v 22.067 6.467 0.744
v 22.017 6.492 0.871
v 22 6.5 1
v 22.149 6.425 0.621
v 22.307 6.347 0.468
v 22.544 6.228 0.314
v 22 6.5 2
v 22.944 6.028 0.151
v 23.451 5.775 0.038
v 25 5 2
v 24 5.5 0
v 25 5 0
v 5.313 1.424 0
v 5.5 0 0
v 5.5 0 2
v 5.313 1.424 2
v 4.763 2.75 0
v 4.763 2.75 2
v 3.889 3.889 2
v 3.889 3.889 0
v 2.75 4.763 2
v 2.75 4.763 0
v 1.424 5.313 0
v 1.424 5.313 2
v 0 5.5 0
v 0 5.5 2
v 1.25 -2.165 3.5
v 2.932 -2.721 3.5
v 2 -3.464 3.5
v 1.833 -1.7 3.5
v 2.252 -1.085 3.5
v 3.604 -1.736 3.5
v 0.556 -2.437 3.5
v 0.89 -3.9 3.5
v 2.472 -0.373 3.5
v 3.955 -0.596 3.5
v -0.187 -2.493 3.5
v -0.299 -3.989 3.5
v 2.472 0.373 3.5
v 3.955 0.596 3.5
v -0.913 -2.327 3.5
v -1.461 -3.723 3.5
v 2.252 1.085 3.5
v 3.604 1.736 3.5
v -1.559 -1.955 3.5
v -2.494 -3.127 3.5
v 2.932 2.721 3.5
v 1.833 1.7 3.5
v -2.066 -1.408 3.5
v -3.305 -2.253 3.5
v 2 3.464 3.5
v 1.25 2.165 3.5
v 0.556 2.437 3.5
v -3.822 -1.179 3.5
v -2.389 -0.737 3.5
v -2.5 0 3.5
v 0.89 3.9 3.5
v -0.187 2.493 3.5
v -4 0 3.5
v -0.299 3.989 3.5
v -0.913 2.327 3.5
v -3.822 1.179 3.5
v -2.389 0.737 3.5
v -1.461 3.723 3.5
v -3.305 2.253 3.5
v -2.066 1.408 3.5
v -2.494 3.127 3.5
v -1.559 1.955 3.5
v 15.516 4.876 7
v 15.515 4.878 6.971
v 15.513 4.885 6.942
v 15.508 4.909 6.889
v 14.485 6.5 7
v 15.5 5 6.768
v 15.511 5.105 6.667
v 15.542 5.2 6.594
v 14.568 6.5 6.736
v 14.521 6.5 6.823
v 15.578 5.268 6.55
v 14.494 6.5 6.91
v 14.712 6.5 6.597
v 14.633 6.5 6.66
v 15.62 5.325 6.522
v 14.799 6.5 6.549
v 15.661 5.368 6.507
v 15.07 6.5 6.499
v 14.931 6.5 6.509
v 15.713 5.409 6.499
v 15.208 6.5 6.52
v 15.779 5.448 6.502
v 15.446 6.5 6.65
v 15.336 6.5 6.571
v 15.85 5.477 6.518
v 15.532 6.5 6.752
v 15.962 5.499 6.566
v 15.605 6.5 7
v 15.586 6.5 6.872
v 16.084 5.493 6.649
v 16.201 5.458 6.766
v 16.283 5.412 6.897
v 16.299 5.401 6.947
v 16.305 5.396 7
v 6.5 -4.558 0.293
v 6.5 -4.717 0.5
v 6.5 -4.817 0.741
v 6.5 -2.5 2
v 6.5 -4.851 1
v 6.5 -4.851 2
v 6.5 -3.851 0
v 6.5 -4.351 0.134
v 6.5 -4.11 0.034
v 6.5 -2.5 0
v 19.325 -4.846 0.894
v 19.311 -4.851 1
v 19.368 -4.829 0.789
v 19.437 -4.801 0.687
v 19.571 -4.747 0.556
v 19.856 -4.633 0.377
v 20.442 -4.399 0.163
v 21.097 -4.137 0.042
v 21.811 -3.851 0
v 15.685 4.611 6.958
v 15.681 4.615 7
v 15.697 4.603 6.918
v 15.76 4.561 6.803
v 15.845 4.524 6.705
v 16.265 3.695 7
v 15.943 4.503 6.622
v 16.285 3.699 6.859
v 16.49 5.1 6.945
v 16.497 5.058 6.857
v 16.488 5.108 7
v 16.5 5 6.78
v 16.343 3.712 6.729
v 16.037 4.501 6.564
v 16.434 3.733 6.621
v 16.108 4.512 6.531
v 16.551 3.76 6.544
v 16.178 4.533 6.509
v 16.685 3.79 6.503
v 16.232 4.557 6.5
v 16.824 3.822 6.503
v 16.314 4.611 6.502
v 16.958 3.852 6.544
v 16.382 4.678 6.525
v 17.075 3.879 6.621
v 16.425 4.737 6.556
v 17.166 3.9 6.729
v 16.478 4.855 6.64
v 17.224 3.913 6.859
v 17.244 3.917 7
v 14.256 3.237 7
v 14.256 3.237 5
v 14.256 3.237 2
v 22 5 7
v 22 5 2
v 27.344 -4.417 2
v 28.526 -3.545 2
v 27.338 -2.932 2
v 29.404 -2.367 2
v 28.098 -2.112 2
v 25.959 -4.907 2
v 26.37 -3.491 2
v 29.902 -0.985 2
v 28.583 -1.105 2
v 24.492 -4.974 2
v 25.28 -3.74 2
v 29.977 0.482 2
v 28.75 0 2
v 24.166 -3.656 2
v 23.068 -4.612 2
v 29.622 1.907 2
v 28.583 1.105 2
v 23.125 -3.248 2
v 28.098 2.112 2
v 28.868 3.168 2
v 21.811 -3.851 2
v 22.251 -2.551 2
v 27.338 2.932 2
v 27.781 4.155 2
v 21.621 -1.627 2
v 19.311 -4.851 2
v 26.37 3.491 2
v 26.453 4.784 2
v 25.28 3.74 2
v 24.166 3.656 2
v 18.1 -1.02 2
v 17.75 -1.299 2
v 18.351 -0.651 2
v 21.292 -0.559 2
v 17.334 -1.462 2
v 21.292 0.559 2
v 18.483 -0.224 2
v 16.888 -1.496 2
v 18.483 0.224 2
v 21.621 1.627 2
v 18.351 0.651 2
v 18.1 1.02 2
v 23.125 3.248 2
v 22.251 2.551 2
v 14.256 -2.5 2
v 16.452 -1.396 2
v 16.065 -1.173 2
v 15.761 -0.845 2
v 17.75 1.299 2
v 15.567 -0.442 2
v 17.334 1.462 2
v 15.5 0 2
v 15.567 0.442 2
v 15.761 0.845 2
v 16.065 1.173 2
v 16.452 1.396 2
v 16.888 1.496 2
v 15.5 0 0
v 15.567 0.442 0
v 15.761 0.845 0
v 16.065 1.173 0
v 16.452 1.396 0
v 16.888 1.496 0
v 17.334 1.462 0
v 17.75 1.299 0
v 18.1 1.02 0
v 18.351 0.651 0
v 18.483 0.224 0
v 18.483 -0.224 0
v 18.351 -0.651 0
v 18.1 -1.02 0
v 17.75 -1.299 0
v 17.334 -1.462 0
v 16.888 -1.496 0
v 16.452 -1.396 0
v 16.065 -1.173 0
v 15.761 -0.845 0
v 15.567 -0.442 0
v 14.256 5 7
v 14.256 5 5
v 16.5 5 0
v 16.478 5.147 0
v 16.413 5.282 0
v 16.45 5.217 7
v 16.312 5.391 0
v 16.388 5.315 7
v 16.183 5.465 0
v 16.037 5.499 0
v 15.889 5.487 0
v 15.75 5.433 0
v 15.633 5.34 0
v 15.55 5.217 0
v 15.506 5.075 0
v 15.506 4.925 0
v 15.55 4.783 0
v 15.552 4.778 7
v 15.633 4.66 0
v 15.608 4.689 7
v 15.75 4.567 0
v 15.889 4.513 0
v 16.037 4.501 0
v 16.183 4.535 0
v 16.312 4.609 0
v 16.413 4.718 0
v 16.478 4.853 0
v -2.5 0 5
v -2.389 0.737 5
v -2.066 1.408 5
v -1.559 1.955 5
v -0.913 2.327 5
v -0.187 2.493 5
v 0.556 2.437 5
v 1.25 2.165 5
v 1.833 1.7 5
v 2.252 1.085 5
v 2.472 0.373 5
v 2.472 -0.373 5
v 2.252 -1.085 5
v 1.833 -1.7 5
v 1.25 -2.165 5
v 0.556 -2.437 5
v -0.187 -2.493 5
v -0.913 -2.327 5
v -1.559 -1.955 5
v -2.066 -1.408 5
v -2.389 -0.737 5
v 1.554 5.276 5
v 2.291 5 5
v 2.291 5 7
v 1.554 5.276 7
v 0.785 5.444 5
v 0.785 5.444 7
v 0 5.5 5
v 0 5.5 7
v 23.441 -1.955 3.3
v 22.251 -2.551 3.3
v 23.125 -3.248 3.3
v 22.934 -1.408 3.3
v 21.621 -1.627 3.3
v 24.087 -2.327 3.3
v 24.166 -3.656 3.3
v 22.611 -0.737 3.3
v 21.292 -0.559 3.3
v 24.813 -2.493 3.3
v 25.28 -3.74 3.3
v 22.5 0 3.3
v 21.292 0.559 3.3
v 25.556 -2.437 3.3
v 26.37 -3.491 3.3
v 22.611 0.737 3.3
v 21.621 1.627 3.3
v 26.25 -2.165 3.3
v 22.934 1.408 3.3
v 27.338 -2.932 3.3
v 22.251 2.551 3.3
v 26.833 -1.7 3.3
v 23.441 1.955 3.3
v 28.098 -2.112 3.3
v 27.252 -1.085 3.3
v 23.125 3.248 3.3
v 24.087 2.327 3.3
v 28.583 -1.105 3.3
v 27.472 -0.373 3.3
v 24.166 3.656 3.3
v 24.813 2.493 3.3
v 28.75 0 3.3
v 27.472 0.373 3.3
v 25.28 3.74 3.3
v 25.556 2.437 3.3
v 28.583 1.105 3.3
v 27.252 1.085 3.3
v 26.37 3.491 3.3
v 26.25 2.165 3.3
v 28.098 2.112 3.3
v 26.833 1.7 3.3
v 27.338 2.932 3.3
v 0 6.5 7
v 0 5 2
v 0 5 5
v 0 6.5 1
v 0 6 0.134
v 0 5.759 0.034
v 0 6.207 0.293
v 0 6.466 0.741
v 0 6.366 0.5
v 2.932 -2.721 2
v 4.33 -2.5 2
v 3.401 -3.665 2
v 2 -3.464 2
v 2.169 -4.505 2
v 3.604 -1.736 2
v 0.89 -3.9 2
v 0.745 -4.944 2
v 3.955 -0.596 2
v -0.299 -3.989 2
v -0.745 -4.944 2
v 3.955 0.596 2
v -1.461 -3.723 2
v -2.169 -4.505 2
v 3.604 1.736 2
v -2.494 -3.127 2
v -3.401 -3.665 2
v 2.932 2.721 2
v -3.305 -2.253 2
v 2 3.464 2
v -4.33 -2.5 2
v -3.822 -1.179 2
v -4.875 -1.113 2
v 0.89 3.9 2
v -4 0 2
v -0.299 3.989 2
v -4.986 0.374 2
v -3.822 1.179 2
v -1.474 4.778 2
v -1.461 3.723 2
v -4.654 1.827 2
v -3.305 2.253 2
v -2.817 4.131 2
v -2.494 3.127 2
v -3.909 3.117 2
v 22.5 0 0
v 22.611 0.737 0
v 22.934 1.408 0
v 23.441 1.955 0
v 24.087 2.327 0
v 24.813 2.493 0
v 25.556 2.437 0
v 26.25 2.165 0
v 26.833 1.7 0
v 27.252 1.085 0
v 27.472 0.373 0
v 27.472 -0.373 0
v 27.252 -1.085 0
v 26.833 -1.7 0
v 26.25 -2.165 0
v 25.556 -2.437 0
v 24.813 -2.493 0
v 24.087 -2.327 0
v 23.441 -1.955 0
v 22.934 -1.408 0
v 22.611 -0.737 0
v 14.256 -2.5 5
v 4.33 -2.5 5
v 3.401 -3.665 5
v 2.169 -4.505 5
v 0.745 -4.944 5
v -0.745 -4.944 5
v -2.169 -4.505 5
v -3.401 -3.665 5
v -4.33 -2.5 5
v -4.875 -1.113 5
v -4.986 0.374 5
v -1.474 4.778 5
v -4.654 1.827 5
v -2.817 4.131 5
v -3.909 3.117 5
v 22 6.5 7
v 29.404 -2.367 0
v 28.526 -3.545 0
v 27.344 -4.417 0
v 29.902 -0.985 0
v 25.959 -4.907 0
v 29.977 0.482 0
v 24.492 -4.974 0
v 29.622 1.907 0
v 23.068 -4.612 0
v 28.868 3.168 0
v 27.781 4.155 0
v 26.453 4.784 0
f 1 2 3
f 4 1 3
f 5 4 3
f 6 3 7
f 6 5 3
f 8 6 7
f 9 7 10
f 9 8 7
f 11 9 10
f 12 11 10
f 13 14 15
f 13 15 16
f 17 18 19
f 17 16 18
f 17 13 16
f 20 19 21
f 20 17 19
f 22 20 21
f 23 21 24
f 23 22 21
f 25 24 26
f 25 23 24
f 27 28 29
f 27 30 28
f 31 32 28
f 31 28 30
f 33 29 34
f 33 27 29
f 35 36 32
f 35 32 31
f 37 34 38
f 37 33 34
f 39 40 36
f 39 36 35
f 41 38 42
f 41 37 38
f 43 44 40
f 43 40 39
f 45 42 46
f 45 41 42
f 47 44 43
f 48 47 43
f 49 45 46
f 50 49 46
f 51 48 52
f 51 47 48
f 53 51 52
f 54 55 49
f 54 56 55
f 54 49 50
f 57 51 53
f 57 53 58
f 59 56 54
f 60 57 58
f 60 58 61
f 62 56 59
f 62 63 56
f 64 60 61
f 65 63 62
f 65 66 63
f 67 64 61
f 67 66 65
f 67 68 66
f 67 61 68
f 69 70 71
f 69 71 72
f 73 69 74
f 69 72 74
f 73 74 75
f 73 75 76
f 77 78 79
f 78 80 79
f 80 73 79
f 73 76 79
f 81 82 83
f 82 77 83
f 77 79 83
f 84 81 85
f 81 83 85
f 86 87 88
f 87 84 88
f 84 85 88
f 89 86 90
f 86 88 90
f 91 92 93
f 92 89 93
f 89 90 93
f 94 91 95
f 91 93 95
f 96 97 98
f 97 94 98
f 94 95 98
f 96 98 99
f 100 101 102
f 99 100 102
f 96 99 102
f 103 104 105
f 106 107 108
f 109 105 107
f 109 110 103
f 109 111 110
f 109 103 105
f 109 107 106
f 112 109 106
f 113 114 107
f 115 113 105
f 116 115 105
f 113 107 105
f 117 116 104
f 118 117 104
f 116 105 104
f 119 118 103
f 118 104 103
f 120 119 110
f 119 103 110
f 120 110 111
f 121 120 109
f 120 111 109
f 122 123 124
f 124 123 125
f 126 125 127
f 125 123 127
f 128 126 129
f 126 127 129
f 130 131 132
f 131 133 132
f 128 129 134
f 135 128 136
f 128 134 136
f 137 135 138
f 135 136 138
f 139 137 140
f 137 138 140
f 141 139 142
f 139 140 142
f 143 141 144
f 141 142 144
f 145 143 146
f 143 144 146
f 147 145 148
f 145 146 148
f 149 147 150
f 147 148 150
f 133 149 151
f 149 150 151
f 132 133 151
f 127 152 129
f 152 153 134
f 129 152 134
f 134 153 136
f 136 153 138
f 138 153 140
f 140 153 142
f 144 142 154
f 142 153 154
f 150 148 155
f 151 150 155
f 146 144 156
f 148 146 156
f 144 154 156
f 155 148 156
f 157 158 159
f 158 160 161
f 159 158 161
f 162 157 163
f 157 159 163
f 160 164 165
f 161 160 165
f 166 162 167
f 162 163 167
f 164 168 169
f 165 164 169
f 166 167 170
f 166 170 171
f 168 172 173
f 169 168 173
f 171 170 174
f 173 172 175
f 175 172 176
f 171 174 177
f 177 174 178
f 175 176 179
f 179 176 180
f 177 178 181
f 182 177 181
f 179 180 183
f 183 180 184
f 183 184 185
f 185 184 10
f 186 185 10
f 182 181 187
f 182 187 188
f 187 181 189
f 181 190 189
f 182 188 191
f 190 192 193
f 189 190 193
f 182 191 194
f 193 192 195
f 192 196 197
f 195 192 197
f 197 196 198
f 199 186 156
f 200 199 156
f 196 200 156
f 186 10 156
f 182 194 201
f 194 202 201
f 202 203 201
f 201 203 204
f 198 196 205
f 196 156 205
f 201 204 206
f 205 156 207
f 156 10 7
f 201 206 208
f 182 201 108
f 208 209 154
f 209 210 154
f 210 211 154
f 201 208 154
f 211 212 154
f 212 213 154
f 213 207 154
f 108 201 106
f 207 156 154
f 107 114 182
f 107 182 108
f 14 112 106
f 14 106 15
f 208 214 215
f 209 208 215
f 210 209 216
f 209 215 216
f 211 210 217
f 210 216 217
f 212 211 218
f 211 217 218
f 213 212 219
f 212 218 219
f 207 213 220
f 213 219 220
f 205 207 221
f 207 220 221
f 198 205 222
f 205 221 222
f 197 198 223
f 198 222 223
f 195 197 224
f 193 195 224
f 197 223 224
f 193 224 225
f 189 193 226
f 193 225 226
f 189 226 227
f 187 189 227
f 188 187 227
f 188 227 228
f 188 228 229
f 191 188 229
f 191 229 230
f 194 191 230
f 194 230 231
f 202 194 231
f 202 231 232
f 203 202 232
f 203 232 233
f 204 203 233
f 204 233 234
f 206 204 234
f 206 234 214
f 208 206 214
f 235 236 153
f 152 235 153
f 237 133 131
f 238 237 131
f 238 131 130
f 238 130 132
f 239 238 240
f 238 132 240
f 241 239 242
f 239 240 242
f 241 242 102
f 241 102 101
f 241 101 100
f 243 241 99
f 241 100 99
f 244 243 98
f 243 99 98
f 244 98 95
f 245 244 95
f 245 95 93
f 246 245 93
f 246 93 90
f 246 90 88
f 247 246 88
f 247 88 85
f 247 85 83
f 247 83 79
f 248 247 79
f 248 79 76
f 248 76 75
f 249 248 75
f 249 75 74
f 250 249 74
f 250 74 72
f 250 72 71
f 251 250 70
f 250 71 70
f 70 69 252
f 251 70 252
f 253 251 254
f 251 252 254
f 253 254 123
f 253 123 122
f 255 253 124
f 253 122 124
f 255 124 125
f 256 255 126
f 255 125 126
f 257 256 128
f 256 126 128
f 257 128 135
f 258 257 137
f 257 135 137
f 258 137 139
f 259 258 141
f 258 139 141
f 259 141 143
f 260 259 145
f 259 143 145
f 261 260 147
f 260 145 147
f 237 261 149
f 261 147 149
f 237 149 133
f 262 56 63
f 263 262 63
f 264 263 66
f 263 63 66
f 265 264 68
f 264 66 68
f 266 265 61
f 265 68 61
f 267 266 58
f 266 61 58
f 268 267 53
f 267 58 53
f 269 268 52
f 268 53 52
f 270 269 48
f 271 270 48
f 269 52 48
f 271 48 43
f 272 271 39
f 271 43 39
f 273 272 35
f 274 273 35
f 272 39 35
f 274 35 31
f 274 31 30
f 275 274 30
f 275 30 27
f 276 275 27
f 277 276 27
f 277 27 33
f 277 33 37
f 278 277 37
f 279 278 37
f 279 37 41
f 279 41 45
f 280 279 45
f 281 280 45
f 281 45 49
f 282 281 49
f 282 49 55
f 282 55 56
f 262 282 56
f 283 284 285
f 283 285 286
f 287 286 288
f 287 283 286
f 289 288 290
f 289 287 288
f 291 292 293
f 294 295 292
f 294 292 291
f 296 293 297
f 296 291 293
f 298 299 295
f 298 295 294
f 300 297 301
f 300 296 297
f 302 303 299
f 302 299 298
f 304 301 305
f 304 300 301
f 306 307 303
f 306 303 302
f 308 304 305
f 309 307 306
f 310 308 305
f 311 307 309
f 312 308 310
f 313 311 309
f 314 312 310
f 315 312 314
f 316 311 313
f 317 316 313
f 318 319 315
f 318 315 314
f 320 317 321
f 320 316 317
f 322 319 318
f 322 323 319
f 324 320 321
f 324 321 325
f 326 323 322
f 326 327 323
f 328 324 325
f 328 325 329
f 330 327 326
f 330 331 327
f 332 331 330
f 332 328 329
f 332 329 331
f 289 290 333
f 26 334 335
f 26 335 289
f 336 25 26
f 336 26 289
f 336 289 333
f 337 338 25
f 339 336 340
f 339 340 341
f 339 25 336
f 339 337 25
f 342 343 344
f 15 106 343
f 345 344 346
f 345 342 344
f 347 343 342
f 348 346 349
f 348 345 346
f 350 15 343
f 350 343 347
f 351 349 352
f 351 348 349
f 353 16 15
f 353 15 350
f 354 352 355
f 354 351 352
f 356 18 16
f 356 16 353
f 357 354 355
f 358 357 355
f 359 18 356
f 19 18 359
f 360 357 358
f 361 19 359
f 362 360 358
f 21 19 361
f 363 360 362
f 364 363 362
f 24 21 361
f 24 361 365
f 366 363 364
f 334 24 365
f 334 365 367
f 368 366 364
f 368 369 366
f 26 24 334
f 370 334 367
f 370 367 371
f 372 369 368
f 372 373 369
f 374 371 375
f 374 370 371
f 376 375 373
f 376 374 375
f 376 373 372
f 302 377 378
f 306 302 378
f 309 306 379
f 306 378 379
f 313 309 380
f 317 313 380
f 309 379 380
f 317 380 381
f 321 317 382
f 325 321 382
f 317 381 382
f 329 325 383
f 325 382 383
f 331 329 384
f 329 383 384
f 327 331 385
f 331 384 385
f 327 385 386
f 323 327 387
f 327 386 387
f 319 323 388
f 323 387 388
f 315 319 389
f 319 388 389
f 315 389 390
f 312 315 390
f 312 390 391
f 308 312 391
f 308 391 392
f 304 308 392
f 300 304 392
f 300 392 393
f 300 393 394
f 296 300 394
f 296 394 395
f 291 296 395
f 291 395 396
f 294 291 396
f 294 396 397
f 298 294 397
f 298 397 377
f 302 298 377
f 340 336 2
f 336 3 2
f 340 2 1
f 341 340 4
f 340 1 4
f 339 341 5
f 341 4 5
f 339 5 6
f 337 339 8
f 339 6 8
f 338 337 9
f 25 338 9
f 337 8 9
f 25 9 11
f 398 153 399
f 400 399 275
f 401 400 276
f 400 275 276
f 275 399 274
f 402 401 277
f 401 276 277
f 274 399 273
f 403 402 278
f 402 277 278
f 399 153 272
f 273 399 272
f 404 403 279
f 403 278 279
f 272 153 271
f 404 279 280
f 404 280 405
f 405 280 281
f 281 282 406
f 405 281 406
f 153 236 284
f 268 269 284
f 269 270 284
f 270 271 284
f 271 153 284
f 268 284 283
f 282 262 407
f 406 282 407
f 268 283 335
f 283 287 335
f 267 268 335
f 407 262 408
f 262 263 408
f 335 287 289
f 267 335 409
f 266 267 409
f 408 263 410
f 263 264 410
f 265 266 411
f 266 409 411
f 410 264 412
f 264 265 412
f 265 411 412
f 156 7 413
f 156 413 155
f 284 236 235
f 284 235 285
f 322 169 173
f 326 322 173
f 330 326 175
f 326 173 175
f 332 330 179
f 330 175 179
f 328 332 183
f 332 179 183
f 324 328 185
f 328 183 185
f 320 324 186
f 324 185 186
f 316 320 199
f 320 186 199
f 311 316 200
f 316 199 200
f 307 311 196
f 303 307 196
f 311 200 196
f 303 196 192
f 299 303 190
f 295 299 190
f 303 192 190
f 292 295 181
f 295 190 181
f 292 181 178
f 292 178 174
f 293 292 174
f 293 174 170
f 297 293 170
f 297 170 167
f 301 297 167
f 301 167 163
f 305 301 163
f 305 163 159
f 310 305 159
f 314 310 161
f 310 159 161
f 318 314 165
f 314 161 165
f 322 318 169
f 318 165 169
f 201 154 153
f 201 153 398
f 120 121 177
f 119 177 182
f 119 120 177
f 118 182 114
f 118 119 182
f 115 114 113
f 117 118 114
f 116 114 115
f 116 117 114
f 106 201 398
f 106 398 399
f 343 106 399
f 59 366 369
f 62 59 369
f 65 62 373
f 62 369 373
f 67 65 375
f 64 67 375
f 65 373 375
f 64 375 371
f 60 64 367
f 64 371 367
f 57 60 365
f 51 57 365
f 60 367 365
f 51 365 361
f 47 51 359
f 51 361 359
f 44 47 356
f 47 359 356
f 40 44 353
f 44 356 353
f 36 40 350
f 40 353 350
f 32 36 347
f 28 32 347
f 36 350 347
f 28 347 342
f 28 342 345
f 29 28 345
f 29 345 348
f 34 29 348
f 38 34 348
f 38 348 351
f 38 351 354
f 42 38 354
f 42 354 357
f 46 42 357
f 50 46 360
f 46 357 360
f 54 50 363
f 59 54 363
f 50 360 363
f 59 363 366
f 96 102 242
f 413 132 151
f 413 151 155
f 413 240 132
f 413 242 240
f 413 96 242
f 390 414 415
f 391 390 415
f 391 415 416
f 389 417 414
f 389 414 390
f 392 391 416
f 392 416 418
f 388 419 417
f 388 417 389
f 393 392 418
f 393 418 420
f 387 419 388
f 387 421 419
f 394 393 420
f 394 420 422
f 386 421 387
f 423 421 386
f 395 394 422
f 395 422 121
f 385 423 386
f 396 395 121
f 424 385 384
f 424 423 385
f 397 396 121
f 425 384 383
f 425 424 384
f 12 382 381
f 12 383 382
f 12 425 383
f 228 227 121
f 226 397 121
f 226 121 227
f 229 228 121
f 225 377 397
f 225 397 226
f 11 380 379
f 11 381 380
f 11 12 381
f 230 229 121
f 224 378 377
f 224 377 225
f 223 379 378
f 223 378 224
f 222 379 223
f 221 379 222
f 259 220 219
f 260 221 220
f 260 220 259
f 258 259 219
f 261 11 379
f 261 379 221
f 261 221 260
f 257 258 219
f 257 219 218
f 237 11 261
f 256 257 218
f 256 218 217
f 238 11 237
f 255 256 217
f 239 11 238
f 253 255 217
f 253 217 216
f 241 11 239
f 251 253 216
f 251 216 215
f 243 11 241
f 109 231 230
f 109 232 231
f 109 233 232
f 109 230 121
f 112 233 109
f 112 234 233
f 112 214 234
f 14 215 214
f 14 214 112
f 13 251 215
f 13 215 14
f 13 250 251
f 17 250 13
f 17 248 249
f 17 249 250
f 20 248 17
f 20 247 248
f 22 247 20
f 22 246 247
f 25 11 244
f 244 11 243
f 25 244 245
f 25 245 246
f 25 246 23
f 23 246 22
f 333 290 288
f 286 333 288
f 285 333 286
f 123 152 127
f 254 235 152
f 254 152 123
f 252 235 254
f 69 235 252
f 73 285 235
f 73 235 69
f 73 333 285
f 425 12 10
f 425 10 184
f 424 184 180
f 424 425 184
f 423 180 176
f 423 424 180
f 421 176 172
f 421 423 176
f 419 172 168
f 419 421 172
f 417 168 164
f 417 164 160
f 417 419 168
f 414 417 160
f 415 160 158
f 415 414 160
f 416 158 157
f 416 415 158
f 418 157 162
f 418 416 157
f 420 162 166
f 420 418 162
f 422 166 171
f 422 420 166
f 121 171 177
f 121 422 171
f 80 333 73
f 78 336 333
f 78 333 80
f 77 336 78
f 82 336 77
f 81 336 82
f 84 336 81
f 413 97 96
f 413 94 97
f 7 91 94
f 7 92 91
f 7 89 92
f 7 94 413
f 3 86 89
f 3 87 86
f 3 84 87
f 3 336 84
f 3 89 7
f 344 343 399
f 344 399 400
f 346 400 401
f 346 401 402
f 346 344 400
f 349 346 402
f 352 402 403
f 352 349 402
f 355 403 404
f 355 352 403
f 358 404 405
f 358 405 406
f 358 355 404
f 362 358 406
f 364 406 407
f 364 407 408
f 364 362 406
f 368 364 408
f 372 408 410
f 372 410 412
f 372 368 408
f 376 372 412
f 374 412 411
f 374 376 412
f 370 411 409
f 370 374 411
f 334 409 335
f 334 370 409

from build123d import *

# Parameters (mm, degrees)
BOSS_EXTRUDE1_DEPTH = 2
BOSS_EXTRUDE2_DEPTH = 5
BOSS_EXTRUDE3_DEPTH = 3
SKETCH7_R           = 2.5
CUT_EXTRUDE1_DEPTH  = 3
SKETCH8_R           = 4
CUT_EXTRUDE2_DEPTH  = 1.5
SKETCH12_R          = 3.75
BOSS_EXTRUDE5_DEPTH = 1.3
SKETCH13_R          = 2.5
CUT_EXTRUDE4_DEPTH  = 32.484122983
FILLET2_R           = 1
SKETCH14_R          = 1.5
CUT_EXTRUDE5_DEPTH  = 10
BOSS_EXTRUDE6_DEPTH = 5
SKETCH17_R          = 0.5
CUT_EXTRUDE6_DEPTH  = 32.484122983
SKETCH19_R          = 0.501737203
CUT_EXTRUDE7_DEPTH  = 5


with BuildPart() as part:
    # Sketch3 → Boss-Extrude1 (new body)
    with BuildSketch(Plane.XY):
        with BuildLine():
            Line((0, 5.5), (0, 6.5))
            Line((0, 6.5), (22, 6.5))
            Line((22, 6.5), (25, 5))
            ThreePointArc((25, 5), (29.704067696, -1.694623001), (21.811351474, -3.851301154))
            Line((21.811351474, -3.851301154), (19.311351474, -4.851301154))
            Line((19.311351474, -4.851301154), (6.5, -4.851301154))
            Line((6.5, -4.851301154), (6.5, -2.5))
            Line((6.5, -2.5), (5.5, 0))
            ThreePointArc((5.5, 0), (3.889087297, 3.889087297), (0, 5.5))
        make_face()
    extrude(amount=BOSS_EXTRUDE1_DEPTH)

    # Sketch4 → Boss-Extrude2 (add)
    with BuildSketch(Plane.XY.offset(2)):
        with BuildLine():
            Line((0, 6.5), (22, 6.5))
            Line((22, 6.5), (22, 5))
            Line((22, 5), (2.291287847, 5))
            ThreePointArc((2.291287847, 5), (1.17260394, 5.373546315), (0, 5.5))
            Line((0, 5.5), (0, 6.5))
        make_face()
    extrude(amount=BOSS_EXTRUDE2_DEPTH)

    # Sketch6 → Boss-Extrude3 (add)
    with BuildSketch(Plane.XY.offset(2)):
        with BuildLine():
            Line((2.291287847, 5), (12.145643924, 5))
            Line((12.145643924, 5), (14.255887023, 5))
            Line((14.255887023, 5), (14.255887023, -2.5))
            Line((14.255887023, -2.5), (12.145643924, -2.5))
            Line((12.145643924, -2.5), (6.5, -2.5))
            Line((6.5, -2.5), (4.330127019, -2.5))
            ThreePointArc((4.330127019, -2.5), (-4.330127019, -2.5), (0, 5))
            Line((0, 5), (0, 5.5))
            ThreePointArc((0, 5.5), (1.17260394, 5.373546315), (2.291287847, 5))
        make_face()
    extrude(amount=BOSS_EXTRUDE3_DEPTH)

    # Sketch7 → Cut-Extrude1 (cut)
    with BuildSketch(Plane(origin=(0, 0, 2), x_dir=(-1, 0, 0), z_dir=(0, 0, -1))):
        Circle(SKETCH7_R)
    extrude(amount=-CUT_EXTRUDE1_DEPTH, mode=Mode.SUBTRACT)

    # Sketch8 → Cut-Extrude2 (cut)
    with BuildSketch(Plane(origin=(0, 0, 2), x_dir=(-1, 0, 0), z_dir=(0, 0, -1))):
        Circle(SKETCH8_R)
    extrude(amount=-CUT_EXTRUDE2_DEPTH, mode=Mode.SUBTRACT)

    # Sketch12 → Boss-Extrude5 (add)
    with BuildSketch(Plane.XY.offset(2)):
        with Locations((25, 0)):
            Circle(SKETCH12_R)
    extrude(amount=BOSS_EXTRUDE5_DEPTH)

    # Sketch13 → Cut-Extrude4 (cut, through all)
    with BuildSketch(Plane(origin=(0, 0, 0), x_dir=(-1, 0, 0), z_dir=(0, 0, -1))):
        with Locations((-25, 0)):
            Circle(SKETCH13_R)
    extrude(amount=-CUT_EXTRUDE4_DEPTH, mode=Mode.SUBTRACT)

    # Fillet2
    fillet2_edges = [part.edges().sort_by_distance(p)[0] for p in [
        (12.905675737, -4.851301154, 0),
        (11, 6.5, 0),
    ]]
    fillet(fillet2_edges, radius=FILLET2_R - 0.0001)  # a hair under: the kernel refuses the full size

    # Sketch14 → Cut-Extrude5 (cut)
    with BuildSketch(Plane(origin=(0, 0, 0), x_dir=(-1, 0, 0), z_dir=(0, 0, -1))):
        with Locations((-17, 0)):
            Circle(SKETCH14_R)
    extrude(amount=-CUT_EXTRUDE5_DEPTH, mode=Mode.SUBTRACT)

    # Sketch16 → Boss-Extrude6 (add)
    with BuildSketch(Plane.XY.offset(2)):
        Polygon((14.255887023, 5), (14.255887023, 3.237297895), (22, 5), align=None)
    extrude(amount=BOSS_EXTRUDE6_DEPTH)

    # Sketch17 → Cut-Extrude6 (cut, through all)
    with BuildSketch(Plane.XY.offset(7)):
        with Locations((16, 5)):
            Circle(SKETCH17_R)
    extrude(amount=-CUT_EXTRUDE6_DEPTH, mode=Mode.SUBTRACT)

    # Sketch19 → Cut-Extrude7 (cut, along a direction that is not the sketch's normal)
    with BuildSketch(Plane(origin=(0.001645419, -0.007228852, 0), x_dir=(0.9750599765095712, 0.2219415288069236, 0), z_dir=(0.2219415288069236, -0.9750599765095712, 0))):
        with Locations((17.181227497, 7)):
            Circle(SKETCH19_R)
    extrude(amount=-CUT_EXTRUDE7_DEPTH, dir=(0.5357888185412162, -0.8443520248842943, 0), mode=Mode.SUBTRACT)


solid = part.part
